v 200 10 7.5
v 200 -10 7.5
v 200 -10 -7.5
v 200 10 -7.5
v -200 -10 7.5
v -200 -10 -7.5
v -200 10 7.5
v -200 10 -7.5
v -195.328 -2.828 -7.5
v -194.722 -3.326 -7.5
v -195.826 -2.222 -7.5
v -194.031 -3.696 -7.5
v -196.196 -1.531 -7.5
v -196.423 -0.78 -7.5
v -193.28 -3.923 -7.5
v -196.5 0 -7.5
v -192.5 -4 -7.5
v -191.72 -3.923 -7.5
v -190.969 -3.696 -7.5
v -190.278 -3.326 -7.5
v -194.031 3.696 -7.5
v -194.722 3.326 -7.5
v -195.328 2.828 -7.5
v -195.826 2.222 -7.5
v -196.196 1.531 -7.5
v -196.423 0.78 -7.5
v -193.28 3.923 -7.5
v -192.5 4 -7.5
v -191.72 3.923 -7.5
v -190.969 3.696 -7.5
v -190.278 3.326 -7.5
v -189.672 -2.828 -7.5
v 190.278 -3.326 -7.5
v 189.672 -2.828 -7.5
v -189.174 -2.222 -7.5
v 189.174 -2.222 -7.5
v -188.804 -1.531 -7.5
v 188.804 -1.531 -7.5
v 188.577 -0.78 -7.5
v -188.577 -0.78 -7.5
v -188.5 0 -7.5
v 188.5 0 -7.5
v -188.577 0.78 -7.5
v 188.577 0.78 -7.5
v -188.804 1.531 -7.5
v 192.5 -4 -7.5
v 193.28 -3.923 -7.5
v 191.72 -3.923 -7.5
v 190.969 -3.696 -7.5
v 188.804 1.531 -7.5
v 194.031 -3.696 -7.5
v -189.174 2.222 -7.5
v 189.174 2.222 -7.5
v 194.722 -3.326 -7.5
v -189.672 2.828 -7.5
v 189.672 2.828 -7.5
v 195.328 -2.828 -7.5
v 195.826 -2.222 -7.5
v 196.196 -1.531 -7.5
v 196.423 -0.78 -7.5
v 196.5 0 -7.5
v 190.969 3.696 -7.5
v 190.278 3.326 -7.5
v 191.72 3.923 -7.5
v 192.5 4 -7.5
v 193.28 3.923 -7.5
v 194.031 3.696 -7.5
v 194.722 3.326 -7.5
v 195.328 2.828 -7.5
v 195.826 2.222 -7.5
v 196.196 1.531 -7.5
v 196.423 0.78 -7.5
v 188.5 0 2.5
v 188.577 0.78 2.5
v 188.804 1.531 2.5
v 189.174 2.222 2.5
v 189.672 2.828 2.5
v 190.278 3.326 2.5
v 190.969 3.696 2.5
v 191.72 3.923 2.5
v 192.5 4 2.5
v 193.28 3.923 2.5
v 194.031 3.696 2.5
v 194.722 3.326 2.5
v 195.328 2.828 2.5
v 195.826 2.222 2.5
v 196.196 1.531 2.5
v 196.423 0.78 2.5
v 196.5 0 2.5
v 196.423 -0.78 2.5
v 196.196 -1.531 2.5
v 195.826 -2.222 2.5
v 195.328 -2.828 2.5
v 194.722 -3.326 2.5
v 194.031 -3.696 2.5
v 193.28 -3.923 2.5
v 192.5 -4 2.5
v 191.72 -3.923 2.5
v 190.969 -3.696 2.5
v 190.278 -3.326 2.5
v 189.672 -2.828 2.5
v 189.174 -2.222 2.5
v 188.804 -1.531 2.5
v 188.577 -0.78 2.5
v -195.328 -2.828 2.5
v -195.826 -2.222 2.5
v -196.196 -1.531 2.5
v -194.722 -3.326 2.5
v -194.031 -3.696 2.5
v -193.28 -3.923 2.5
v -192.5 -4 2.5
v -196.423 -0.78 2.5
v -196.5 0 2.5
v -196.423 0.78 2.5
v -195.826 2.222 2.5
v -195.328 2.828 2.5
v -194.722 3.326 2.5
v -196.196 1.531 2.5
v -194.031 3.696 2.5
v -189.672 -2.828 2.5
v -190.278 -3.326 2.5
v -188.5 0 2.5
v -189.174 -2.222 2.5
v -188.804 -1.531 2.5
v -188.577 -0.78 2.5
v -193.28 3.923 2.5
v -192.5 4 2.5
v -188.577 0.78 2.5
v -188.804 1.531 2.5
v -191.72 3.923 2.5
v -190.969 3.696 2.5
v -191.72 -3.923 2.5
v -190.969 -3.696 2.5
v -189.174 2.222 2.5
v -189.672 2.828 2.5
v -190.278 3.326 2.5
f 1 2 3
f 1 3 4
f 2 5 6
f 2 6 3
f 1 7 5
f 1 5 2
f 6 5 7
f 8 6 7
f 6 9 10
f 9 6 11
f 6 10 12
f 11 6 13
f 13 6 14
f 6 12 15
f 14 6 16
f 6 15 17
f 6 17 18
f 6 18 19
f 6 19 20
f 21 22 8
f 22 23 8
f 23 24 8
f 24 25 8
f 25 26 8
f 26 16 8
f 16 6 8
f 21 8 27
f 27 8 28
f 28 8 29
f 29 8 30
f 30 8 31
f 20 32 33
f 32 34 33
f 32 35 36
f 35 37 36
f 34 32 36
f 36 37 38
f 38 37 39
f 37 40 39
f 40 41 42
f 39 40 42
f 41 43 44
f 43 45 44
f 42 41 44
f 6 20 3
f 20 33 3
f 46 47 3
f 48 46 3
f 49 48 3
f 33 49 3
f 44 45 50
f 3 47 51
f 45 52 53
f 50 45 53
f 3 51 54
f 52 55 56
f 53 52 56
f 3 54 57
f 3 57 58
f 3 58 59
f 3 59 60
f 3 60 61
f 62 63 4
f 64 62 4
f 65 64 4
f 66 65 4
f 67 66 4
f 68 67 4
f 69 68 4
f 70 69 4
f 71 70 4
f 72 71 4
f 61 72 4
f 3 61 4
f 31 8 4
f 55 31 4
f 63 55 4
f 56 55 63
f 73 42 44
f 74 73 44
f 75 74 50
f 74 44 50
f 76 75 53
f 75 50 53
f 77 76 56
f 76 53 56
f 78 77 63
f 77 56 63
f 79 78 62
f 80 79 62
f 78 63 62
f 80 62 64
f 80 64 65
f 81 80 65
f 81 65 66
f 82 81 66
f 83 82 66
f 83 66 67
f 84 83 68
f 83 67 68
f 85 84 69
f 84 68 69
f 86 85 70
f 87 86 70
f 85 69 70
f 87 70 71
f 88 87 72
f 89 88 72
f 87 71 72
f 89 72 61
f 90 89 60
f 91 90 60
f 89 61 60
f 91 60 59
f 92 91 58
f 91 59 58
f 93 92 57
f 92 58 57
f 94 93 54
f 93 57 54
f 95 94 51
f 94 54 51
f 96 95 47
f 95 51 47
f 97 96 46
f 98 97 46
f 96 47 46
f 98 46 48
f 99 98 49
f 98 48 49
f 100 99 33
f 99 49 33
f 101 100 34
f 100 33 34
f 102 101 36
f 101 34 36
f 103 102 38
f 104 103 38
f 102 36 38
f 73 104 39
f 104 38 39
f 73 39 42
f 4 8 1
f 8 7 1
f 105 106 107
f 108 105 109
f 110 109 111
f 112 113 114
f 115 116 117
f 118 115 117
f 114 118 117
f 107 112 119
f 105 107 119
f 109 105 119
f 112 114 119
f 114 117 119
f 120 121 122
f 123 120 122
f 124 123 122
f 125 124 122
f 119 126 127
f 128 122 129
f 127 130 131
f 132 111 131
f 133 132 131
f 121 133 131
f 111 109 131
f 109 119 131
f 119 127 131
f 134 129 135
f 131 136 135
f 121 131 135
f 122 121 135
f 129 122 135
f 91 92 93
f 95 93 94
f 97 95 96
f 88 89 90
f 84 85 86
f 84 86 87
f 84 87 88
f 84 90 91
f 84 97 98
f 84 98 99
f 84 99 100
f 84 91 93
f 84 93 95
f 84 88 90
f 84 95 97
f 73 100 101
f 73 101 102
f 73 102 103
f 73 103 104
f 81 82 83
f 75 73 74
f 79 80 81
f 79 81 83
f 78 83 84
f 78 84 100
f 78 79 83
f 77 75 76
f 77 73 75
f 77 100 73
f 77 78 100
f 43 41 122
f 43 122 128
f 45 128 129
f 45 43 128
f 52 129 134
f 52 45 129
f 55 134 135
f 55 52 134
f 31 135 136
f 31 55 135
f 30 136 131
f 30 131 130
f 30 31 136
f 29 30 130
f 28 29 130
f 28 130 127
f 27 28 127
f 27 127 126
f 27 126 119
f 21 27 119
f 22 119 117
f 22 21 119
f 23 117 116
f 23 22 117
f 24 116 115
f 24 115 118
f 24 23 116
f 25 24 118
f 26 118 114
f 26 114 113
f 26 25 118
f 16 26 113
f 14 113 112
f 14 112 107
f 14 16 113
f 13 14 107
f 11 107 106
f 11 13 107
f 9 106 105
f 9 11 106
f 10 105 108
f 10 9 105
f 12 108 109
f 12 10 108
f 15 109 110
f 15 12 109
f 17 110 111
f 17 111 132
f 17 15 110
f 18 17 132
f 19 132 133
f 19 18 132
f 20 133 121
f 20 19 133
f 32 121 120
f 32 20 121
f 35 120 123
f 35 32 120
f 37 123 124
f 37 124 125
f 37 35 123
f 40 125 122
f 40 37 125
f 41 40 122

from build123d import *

# Parameters (mm, degrees)
SKETCH1_W           = 400
SKETCH1_H           = 20
BOSS_EXTRUDE1_DEPTH = 7.5
SKETCH2_R           = 4
CUT_EXTRUDE1_DEPTH  = 10


with BuildPart() as part:
    # Sketch1 → Boss-Extrude1 (new body, symmetric)
    with BuildSketch(Plane.XY):
        Rectangle(SKETCH1_W, SKETCH1_H)
    extrude(amount=BOSS_EXTRUDE1_DEPTH, both=True)

    # Sketch2 → Cut-Extrude1 (cut)
    with BuildSketch(Plane(origin=(0, 0, -7.5), x_dir=(-1, 0, 0), z_dir=(0, 0, -1))):
        with Locations((-192.5, 0)):
            Circle(SKETCH2_R)
    cut_extrude1 = extrude(amount=-CUT_EXTRUDE1_DEPTH, mode=Mode.SUBTRACT)

    # Mirror1: Cut-Extrude1 across plane
    add(cut_extrude1.mirror(Plane(origin=(0, 0, 0), x_dir=(0, 0, 1), z_dir=(1, 0, 0))), mode=Mode.SUBTRACT)


solid = part.part
